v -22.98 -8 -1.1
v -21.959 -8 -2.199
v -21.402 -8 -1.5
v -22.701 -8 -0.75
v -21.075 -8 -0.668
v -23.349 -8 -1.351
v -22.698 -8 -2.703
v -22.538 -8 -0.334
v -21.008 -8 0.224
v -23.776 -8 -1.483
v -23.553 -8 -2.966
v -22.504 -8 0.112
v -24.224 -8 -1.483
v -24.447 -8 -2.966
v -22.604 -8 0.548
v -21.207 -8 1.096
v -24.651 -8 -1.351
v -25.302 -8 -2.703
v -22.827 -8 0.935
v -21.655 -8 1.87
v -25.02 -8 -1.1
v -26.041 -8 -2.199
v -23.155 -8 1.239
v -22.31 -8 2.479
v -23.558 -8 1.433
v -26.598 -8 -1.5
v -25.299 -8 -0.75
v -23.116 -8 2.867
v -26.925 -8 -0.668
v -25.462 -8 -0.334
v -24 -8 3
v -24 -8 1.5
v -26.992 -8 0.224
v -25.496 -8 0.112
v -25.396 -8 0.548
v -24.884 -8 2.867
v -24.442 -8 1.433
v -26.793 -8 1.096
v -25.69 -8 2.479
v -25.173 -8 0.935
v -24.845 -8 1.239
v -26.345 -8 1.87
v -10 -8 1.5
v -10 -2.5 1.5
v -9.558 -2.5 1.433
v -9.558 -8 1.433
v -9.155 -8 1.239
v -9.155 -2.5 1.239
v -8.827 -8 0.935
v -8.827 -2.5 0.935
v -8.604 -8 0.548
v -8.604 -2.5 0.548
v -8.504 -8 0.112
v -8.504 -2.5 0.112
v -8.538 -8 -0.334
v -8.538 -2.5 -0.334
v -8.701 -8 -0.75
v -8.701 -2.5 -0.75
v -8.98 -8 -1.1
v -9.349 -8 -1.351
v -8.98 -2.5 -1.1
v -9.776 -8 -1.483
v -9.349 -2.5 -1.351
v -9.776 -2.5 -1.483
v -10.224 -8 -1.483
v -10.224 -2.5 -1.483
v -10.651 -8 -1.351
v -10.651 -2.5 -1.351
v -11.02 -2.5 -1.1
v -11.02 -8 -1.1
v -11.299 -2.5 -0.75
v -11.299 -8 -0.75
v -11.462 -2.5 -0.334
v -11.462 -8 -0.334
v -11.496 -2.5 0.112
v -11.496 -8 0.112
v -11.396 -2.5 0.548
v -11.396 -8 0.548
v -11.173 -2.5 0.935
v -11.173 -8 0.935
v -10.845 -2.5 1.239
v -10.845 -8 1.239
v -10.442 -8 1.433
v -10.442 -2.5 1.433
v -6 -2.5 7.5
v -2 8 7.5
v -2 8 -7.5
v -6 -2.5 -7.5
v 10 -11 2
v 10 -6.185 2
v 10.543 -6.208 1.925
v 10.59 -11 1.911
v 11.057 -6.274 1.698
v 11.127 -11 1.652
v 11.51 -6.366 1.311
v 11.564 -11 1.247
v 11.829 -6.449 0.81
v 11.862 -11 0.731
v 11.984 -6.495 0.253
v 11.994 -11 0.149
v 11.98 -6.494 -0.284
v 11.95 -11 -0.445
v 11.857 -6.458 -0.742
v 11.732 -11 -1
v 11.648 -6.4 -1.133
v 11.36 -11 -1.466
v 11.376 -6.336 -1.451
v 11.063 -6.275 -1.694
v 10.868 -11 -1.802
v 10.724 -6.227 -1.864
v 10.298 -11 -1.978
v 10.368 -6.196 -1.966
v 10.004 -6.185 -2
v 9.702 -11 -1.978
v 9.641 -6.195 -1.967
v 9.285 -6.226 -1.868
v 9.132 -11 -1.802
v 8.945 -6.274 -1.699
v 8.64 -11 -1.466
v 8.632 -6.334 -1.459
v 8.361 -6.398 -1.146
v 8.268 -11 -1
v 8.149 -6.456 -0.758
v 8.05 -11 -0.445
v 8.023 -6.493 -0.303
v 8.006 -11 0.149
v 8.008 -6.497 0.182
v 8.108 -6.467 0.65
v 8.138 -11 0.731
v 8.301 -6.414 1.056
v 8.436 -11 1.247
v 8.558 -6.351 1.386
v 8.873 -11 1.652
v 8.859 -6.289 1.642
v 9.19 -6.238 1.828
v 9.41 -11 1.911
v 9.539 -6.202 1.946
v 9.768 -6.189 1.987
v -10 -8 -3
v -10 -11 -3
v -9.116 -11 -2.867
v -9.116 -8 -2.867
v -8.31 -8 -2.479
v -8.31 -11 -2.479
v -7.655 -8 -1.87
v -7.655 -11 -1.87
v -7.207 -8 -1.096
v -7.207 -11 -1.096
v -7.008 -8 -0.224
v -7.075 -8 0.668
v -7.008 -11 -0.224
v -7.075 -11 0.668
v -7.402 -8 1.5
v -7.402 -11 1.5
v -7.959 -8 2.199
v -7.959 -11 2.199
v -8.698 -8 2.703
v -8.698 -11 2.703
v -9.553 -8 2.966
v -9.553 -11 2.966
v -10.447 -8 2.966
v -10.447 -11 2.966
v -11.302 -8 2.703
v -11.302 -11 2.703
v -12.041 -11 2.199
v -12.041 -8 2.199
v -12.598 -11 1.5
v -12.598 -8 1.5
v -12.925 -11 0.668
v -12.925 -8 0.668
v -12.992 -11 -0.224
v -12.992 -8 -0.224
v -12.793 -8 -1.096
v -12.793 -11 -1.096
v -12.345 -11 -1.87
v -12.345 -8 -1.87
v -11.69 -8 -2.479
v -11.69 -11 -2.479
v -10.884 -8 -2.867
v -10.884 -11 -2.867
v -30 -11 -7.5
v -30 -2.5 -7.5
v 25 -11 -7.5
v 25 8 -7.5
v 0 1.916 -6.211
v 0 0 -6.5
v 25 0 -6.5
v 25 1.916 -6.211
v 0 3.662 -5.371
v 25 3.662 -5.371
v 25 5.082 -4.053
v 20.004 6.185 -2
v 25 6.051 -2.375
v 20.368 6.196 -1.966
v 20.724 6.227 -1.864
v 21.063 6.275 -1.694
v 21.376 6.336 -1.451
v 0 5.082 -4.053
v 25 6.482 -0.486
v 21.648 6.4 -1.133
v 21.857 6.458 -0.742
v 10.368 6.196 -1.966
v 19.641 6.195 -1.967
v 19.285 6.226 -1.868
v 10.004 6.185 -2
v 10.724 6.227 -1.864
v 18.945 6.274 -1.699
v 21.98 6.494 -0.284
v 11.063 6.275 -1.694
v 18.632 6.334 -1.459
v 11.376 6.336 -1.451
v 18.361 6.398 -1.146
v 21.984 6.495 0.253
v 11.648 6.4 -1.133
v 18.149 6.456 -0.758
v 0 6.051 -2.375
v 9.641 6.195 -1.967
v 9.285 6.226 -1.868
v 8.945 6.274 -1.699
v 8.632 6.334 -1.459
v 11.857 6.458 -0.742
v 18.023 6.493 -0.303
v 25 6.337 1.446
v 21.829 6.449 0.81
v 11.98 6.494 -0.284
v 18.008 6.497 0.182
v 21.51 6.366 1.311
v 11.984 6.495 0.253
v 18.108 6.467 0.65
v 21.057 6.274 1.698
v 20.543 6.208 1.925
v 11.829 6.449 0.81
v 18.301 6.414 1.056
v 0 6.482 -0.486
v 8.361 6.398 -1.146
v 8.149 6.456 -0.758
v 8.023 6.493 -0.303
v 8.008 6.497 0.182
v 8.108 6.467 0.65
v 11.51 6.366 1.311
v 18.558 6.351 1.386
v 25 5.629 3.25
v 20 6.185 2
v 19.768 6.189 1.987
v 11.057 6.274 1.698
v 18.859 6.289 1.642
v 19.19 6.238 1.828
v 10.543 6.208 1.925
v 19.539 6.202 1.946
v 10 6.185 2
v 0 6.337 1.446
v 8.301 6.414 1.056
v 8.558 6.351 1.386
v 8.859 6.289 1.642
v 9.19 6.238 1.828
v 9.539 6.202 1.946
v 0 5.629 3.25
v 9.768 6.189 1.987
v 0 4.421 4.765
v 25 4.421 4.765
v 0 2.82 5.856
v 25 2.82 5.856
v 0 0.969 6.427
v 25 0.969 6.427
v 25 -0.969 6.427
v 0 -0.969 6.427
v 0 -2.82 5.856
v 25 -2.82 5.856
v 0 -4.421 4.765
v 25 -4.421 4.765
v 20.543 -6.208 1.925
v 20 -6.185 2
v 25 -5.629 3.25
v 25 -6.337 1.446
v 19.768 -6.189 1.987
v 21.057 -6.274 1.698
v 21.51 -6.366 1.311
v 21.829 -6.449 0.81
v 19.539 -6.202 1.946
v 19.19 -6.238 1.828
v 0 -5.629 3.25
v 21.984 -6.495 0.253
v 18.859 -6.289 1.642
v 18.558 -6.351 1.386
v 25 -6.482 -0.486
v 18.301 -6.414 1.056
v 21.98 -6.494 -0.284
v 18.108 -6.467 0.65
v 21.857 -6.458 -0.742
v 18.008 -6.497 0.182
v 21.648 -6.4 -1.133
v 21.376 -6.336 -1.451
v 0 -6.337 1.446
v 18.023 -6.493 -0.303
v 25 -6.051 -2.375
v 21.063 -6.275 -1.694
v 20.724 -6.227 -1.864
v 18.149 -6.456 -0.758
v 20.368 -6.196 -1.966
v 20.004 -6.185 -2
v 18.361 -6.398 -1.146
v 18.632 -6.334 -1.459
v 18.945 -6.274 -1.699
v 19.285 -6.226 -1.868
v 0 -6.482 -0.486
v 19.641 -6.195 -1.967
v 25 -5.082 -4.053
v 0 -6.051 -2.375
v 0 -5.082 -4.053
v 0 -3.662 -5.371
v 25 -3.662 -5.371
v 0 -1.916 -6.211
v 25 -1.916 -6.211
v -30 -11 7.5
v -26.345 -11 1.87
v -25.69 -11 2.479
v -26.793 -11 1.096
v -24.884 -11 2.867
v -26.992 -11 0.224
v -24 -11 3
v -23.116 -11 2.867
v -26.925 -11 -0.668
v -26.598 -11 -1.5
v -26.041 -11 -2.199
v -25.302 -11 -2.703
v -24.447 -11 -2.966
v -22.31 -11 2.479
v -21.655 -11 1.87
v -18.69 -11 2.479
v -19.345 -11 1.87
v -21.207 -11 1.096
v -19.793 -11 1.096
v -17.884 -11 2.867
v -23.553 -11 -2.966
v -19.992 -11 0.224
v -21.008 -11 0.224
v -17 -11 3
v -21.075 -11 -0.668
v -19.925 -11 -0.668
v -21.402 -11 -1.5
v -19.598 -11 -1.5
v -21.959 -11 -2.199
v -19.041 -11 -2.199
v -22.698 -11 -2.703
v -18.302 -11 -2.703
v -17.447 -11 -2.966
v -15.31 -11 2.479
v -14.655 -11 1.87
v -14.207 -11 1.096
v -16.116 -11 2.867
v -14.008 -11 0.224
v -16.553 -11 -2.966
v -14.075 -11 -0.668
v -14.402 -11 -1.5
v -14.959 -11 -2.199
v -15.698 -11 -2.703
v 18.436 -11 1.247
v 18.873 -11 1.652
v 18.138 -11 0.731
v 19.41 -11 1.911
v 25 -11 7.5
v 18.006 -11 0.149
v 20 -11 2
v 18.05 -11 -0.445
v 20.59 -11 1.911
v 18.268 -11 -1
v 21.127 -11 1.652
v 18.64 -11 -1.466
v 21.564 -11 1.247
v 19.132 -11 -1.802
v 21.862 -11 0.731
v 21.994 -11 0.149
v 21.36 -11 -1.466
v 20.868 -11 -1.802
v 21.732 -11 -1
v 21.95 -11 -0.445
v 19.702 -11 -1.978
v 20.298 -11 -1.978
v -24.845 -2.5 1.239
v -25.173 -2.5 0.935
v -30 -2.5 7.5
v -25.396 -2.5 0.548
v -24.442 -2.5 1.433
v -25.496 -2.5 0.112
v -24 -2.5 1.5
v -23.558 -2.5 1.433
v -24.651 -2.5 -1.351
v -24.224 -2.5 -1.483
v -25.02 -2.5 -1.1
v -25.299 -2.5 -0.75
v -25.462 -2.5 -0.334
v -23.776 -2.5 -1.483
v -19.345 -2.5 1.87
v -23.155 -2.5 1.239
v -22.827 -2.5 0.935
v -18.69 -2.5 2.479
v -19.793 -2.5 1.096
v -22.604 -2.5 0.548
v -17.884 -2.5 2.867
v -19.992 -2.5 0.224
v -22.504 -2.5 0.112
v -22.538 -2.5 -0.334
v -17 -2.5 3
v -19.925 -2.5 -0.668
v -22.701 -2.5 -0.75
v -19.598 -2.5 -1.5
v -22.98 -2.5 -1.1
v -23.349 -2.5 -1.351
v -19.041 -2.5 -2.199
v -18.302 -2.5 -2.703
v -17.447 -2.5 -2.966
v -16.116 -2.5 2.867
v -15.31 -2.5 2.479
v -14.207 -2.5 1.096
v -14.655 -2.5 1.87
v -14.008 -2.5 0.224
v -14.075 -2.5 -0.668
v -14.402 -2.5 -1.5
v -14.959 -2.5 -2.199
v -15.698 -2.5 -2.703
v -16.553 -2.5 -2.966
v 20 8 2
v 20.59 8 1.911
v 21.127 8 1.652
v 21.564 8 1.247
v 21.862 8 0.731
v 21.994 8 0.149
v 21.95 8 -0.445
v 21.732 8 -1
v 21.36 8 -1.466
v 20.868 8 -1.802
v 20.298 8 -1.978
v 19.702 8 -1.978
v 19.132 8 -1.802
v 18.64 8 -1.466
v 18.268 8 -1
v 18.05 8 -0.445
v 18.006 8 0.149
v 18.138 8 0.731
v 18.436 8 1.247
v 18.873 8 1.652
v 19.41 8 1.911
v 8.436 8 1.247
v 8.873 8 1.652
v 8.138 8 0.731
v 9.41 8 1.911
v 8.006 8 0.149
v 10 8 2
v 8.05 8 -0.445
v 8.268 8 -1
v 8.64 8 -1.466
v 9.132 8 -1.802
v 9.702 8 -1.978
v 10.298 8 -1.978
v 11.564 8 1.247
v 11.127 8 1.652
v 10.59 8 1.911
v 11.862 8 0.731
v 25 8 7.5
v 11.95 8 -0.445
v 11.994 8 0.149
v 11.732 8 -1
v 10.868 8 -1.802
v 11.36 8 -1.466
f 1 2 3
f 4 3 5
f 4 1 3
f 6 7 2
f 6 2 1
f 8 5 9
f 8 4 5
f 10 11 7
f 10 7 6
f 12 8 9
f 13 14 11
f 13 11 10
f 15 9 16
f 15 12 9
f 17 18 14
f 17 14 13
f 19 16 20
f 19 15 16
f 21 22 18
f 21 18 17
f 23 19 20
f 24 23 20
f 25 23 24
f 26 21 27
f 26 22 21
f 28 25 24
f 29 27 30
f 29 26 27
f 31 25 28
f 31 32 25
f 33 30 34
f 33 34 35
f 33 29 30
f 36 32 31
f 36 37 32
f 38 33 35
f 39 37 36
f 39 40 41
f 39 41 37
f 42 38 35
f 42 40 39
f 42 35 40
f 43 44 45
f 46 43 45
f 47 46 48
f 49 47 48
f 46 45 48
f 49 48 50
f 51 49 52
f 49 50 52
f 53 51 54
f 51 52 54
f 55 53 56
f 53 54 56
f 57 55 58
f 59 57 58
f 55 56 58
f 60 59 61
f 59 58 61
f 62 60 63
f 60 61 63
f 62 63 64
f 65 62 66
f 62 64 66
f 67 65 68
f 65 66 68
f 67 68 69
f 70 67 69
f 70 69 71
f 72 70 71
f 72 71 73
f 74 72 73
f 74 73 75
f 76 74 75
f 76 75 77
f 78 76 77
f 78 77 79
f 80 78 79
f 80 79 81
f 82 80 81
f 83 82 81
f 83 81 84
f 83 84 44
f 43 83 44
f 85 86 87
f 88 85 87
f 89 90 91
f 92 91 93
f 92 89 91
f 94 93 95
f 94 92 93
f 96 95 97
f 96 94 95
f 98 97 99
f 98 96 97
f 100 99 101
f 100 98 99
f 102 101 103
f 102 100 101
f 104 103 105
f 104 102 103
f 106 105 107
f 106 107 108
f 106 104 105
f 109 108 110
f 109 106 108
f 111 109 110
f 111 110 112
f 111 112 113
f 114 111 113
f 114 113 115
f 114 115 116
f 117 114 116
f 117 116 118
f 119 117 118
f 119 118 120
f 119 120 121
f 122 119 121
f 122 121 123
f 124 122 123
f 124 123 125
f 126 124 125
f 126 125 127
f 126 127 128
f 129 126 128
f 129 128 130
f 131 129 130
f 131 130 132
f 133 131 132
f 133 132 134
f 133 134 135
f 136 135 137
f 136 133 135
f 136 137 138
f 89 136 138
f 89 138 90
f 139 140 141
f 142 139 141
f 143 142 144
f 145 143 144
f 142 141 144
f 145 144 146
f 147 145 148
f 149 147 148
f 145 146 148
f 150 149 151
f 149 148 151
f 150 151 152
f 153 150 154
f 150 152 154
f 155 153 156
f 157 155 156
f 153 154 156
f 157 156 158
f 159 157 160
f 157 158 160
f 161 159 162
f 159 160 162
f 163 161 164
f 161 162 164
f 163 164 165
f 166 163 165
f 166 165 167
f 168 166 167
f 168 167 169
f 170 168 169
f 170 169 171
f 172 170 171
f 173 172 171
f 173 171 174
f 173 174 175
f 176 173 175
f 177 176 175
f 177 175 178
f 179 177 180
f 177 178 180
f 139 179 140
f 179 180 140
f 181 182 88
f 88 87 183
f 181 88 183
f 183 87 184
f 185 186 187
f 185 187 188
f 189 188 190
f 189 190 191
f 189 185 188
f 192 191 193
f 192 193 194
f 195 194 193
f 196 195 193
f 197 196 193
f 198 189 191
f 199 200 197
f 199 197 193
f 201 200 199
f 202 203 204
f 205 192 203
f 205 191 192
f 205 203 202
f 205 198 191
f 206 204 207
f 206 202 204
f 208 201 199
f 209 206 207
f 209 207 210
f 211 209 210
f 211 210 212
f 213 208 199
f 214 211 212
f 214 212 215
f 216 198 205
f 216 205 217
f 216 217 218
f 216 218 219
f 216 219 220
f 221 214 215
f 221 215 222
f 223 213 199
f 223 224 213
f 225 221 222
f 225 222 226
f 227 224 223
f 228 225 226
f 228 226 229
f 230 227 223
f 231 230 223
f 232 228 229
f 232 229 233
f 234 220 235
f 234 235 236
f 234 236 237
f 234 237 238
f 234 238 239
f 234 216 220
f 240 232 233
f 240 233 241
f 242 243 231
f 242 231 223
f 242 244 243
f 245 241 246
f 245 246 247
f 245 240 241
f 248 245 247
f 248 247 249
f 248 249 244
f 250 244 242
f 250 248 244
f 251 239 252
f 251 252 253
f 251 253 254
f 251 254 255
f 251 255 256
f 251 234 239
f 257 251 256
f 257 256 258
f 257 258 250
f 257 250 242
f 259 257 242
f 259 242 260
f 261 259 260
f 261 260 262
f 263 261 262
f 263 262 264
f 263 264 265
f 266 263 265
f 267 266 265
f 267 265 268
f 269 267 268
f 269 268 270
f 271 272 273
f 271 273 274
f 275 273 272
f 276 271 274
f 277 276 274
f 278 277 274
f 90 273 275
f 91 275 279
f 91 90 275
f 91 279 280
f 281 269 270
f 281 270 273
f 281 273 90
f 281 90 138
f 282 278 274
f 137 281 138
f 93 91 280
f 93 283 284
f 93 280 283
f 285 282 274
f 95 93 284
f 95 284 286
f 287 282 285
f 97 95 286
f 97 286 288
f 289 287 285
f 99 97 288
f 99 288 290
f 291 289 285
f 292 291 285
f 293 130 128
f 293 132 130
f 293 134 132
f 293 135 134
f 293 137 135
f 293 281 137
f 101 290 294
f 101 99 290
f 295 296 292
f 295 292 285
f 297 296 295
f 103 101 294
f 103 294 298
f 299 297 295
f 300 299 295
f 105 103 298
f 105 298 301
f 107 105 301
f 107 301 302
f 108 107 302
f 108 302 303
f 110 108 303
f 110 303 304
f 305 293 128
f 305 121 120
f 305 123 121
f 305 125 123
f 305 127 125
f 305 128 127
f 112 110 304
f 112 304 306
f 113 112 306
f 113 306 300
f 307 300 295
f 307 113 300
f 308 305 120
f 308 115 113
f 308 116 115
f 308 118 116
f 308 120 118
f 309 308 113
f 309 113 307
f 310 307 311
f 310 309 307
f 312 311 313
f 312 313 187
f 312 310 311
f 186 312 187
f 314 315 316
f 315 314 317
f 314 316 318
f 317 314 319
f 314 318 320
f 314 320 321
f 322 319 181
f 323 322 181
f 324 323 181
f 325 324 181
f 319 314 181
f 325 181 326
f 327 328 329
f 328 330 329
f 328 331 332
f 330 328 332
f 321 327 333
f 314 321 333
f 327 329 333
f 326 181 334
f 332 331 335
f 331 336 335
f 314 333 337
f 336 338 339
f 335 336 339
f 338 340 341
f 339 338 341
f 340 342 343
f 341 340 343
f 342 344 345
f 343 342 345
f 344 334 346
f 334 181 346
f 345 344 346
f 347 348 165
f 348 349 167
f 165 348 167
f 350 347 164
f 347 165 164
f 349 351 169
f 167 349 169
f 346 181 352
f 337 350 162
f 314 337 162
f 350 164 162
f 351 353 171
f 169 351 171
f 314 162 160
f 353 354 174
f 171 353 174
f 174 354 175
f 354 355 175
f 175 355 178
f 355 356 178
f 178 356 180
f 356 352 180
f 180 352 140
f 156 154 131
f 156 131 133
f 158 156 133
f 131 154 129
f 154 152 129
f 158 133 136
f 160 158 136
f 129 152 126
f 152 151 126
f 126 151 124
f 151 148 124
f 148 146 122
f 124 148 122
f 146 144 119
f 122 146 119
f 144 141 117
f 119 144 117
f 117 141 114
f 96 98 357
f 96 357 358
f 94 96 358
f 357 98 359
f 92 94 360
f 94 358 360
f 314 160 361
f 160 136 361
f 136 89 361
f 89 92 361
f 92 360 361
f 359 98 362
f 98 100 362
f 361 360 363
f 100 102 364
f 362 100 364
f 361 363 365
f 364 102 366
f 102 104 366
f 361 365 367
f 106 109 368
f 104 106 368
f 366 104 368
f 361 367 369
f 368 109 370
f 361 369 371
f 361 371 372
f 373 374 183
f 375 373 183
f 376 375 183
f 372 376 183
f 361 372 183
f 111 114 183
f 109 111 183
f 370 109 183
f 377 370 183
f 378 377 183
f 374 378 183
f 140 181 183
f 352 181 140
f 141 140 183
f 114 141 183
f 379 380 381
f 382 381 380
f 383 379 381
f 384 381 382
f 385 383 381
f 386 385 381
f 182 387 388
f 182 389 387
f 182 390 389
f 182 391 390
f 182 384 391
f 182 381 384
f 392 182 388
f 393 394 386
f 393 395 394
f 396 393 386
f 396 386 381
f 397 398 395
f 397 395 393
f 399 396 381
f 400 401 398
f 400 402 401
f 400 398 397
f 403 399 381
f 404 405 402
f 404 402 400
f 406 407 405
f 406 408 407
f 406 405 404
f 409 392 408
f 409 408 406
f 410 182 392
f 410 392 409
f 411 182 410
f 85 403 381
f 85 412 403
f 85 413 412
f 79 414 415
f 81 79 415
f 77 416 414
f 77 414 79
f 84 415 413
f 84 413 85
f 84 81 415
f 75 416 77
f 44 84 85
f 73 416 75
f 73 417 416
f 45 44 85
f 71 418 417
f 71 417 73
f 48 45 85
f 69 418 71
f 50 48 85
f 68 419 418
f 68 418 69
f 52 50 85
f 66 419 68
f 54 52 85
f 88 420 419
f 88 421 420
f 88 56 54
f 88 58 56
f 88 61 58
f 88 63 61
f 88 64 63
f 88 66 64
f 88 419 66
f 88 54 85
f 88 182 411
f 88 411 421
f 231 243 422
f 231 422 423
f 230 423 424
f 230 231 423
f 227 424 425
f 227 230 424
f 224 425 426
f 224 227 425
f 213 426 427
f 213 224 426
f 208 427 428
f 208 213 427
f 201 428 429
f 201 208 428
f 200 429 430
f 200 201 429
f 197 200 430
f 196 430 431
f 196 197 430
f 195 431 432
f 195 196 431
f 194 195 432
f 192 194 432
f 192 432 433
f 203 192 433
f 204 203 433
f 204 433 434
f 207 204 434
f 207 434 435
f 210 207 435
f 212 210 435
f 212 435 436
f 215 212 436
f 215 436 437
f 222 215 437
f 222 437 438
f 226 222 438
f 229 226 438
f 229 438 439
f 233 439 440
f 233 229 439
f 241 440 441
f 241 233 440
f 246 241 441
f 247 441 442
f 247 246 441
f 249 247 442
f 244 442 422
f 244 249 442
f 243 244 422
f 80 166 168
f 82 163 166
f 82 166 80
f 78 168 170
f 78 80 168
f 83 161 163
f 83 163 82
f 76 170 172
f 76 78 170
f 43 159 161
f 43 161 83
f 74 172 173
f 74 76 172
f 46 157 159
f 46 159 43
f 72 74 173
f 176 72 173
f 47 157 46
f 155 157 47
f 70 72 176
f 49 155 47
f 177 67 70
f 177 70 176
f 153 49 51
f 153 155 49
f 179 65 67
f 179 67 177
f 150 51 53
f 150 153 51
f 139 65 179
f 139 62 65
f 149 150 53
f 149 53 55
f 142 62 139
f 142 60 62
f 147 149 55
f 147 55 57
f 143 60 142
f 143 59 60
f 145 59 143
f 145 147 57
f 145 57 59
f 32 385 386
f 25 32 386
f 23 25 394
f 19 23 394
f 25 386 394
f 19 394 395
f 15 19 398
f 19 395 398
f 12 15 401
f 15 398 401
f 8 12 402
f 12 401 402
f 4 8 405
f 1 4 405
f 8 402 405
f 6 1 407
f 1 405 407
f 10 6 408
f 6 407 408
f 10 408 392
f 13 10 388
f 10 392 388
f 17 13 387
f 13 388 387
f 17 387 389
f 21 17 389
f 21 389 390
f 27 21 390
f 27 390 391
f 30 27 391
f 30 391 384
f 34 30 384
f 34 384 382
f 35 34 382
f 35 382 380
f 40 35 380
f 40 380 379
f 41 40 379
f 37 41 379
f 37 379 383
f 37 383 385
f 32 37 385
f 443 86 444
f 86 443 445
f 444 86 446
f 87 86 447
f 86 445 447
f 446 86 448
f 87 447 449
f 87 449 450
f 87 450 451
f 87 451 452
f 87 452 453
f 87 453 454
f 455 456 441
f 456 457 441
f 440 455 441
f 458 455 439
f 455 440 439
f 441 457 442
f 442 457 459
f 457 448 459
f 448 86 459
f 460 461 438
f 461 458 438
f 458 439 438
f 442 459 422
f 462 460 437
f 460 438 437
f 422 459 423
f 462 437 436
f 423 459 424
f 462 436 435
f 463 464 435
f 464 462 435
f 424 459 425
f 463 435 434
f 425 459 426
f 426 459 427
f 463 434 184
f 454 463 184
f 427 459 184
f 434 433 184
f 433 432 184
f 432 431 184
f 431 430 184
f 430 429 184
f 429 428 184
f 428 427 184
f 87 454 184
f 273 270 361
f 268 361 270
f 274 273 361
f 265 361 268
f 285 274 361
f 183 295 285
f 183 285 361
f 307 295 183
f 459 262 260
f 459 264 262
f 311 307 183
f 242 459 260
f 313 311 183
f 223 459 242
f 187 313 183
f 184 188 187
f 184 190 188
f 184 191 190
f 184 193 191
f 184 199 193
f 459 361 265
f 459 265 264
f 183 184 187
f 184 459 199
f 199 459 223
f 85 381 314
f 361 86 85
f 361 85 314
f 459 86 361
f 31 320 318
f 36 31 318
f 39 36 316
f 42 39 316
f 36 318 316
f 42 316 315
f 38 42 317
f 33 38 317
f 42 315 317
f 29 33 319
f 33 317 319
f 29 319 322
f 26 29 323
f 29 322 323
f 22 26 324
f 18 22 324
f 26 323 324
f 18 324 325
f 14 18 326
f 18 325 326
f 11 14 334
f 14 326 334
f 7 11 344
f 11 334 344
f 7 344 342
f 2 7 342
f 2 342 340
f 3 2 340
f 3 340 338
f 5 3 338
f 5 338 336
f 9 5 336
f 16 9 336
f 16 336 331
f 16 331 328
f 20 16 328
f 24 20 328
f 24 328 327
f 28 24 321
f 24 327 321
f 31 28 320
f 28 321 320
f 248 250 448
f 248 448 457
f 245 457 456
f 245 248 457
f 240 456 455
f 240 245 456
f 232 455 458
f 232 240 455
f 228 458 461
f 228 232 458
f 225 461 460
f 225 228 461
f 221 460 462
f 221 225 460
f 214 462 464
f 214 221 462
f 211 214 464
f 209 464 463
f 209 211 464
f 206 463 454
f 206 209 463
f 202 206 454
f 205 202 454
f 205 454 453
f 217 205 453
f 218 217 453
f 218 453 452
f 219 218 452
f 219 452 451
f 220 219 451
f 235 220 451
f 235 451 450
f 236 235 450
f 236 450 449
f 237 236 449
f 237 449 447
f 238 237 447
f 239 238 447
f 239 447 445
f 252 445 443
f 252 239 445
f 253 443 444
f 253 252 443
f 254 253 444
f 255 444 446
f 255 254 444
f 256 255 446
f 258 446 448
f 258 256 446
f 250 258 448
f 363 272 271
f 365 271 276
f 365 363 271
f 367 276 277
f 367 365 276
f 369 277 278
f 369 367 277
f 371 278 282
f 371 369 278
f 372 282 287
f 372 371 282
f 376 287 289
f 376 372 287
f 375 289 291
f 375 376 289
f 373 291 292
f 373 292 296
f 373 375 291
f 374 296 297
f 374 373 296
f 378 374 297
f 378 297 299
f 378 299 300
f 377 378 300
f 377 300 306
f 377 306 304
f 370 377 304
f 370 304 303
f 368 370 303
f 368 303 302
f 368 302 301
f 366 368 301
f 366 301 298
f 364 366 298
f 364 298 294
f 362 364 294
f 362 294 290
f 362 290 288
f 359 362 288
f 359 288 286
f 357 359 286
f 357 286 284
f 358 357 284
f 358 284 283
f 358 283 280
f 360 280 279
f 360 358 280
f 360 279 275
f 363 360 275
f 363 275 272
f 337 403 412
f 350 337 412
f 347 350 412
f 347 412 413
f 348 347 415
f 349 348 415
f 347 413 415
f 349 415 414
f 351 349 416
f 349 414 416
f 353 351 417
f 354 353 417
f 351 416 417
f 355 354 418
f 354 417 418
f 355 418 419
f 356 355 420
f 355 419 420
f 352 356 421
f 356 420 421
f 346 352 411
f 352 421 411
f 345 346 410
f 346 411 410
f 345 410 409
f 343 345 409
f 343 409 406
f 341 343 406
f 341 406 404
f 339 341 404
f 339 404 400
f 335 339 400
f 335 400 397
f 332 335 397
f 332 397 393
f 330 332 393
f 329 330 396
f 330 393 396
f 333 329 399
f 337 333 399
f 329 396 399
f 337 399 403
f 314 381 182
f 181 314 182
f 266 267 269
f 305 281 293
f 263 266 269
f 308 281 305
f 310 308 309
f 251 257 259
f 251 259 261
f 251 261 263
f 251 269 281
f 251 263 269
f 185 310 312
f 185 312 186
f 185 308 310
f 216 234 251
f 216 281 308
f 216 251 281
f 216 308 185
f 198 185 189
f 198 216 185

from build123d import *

# Parameters (mm, degrees)
SKETCH1_W               = 15
SKETCH1_H               = 19
SKETCH1_R               = 6.5
BOSS_EXTRUDE1_DEPTH     = 25
SKETCH2_W               = 15
SKETCH2_H               = 19
BOSS_EXTRUDE2_DEPTH     = 2
CUT_EXTRUDE1_DEPTH      = 29.324018077
CUT_EXTRUDE1_DEPTH_BACK = 29.324018077
SKETCH4_R               = 2
SKETCH3_W               = 28
SKETCH3_H               = 15
SKETCH3_R               = 3
BOSS_EXTRUDE3_DEPTH     = 8.5
CHAMFER1_SIZE2          = 10.5
CHAMFER1_SIZE           = 4
SKETCH6_R               = 1.5
CUT_EXTRUDE3_DEPTH      = 33.657311618
SKETCH7_R               = 3
CUT_EXTRUDE4_DEPTH      = 3


with BuildPart() as part:
    # Sketch1 → Boss-Extrude1 (new body)
    with BuildSketch(Plane(origin=(0, 0, 0), x_dir=(0, 0, -1), z_dir=(1, 0, 0))):
        with Locations((0, -1.5)):
            Rectangle(SKETCH1_W, SKETCH1_H)
        Circle(SKETCH1_R, mode=Mode.SUBTRACT)
    extrude(amount=BOSS_EXTRUDE1_DEPTH)

    # Sketch2 → Boss-Extrude2 (add)
    with BuildSketch(Plane(origin=(0, 0, 0), x_dir=(0, 0, -1), z_dir=(1, 0, 0))):
        with Locations((0, -1.5)):
            Rectangle(SKETCH2_W, SKETCH2_H)
    extrude(amount=-BOSS_EXTRUDE2_DEPTH)

    # Sketch4 → Cut-Extrude1 (cut, two sides: drawn at the far end of the back side and taken through both)
    with BuildSketch(Plane(origin=(0, 0, 0), x_dir=(1, 0, 0), z_dir=(0, 1, 0)).offset(-CUT_EXTRUDE1_DEPTH_BACK)):
        with Locations(Location((10, 0, 0), (0, 0, 270))):
            Circle(SKETCH4_R)
        with Locations(Location((20, 0, 0), (0, 0, 270))):
            Circle(SKETCH4_R)
    extrude(amount=CUT_EXTRUDE1_DEPTH + CUT_EXTRUDE1_DEPTH_BACK, mode=Mode.SUBTRACT)

    # Sketch3 → Boss-Extrude3 (add)
    with BuildSketch(Plane(origin=(0, -2.5, 0), x_dir=(1, 0, 0), z_dir=(0, 1, 0))):
        with Locations((-16, 0)):
            Rectangle(SKETCH3_W, SKETCH3_H)
        with Locations(Location((-17, 0, 0), (0, 0, 270))):
            Circle(SKETCH3_R, mode=Mode.SUBTRACT)
    extrude(amount=-BOSS_EXTRUDE3_DEPTH)

    # Chamfer1
    chamfer1_edges = [part.edges().sort_by_distance(p)[0] for p in [
        (-2, -2.5, 0),
    ]]
    chamfer1_side = [part.faces().sort_by_distance(p)[0] for p in [
        (-2.08, -2.5, 0),
    ]]
    chamfer(chamfer1_edges, length=CHAMFER1_SIZE - 0.0001, length2=CHAMFER1_SIZE2 - 0.0001, reference=chamfer1_side[0])  # a hair under: the kernel refuses the full size

    # Sketch6 → Cut-Extrude3 (cut, through all)
    with BuildSketch(Plane(origin=(0, -2.5, 0), x_dir=(1, 0, 0), z_dir=(0, 1, 0))):
        with Locations(Location((-24, 0, 0), (0, 0, 270))):
            Circle(SKETCH6_R)
        with Locations(Location((-10, 0, 0), (0, 0, 270))):
            Circle(SKETCH6_R)
    extrude(amount=-CUT_EXTRUDE3_DEPTH, mode=Mode.SUBTRACT)

    # Sketch7 → Cut-Extrude4 (cut)
    with BuildSketch(Plane.XZ.offset(11)):
        with Locations(Location((-10, 0, 0), (0, 0, 270))):
            Circle(SKETCH7_R)
        with Locations(Location((-24, 0, 0), (0, 0, 90))):
            Circle(SKETCH7_R)
    extrude(amount=-CUT_EXTRUDE4_DEPTH, mode=Mode.SUBTRACT)


solid = part.part
